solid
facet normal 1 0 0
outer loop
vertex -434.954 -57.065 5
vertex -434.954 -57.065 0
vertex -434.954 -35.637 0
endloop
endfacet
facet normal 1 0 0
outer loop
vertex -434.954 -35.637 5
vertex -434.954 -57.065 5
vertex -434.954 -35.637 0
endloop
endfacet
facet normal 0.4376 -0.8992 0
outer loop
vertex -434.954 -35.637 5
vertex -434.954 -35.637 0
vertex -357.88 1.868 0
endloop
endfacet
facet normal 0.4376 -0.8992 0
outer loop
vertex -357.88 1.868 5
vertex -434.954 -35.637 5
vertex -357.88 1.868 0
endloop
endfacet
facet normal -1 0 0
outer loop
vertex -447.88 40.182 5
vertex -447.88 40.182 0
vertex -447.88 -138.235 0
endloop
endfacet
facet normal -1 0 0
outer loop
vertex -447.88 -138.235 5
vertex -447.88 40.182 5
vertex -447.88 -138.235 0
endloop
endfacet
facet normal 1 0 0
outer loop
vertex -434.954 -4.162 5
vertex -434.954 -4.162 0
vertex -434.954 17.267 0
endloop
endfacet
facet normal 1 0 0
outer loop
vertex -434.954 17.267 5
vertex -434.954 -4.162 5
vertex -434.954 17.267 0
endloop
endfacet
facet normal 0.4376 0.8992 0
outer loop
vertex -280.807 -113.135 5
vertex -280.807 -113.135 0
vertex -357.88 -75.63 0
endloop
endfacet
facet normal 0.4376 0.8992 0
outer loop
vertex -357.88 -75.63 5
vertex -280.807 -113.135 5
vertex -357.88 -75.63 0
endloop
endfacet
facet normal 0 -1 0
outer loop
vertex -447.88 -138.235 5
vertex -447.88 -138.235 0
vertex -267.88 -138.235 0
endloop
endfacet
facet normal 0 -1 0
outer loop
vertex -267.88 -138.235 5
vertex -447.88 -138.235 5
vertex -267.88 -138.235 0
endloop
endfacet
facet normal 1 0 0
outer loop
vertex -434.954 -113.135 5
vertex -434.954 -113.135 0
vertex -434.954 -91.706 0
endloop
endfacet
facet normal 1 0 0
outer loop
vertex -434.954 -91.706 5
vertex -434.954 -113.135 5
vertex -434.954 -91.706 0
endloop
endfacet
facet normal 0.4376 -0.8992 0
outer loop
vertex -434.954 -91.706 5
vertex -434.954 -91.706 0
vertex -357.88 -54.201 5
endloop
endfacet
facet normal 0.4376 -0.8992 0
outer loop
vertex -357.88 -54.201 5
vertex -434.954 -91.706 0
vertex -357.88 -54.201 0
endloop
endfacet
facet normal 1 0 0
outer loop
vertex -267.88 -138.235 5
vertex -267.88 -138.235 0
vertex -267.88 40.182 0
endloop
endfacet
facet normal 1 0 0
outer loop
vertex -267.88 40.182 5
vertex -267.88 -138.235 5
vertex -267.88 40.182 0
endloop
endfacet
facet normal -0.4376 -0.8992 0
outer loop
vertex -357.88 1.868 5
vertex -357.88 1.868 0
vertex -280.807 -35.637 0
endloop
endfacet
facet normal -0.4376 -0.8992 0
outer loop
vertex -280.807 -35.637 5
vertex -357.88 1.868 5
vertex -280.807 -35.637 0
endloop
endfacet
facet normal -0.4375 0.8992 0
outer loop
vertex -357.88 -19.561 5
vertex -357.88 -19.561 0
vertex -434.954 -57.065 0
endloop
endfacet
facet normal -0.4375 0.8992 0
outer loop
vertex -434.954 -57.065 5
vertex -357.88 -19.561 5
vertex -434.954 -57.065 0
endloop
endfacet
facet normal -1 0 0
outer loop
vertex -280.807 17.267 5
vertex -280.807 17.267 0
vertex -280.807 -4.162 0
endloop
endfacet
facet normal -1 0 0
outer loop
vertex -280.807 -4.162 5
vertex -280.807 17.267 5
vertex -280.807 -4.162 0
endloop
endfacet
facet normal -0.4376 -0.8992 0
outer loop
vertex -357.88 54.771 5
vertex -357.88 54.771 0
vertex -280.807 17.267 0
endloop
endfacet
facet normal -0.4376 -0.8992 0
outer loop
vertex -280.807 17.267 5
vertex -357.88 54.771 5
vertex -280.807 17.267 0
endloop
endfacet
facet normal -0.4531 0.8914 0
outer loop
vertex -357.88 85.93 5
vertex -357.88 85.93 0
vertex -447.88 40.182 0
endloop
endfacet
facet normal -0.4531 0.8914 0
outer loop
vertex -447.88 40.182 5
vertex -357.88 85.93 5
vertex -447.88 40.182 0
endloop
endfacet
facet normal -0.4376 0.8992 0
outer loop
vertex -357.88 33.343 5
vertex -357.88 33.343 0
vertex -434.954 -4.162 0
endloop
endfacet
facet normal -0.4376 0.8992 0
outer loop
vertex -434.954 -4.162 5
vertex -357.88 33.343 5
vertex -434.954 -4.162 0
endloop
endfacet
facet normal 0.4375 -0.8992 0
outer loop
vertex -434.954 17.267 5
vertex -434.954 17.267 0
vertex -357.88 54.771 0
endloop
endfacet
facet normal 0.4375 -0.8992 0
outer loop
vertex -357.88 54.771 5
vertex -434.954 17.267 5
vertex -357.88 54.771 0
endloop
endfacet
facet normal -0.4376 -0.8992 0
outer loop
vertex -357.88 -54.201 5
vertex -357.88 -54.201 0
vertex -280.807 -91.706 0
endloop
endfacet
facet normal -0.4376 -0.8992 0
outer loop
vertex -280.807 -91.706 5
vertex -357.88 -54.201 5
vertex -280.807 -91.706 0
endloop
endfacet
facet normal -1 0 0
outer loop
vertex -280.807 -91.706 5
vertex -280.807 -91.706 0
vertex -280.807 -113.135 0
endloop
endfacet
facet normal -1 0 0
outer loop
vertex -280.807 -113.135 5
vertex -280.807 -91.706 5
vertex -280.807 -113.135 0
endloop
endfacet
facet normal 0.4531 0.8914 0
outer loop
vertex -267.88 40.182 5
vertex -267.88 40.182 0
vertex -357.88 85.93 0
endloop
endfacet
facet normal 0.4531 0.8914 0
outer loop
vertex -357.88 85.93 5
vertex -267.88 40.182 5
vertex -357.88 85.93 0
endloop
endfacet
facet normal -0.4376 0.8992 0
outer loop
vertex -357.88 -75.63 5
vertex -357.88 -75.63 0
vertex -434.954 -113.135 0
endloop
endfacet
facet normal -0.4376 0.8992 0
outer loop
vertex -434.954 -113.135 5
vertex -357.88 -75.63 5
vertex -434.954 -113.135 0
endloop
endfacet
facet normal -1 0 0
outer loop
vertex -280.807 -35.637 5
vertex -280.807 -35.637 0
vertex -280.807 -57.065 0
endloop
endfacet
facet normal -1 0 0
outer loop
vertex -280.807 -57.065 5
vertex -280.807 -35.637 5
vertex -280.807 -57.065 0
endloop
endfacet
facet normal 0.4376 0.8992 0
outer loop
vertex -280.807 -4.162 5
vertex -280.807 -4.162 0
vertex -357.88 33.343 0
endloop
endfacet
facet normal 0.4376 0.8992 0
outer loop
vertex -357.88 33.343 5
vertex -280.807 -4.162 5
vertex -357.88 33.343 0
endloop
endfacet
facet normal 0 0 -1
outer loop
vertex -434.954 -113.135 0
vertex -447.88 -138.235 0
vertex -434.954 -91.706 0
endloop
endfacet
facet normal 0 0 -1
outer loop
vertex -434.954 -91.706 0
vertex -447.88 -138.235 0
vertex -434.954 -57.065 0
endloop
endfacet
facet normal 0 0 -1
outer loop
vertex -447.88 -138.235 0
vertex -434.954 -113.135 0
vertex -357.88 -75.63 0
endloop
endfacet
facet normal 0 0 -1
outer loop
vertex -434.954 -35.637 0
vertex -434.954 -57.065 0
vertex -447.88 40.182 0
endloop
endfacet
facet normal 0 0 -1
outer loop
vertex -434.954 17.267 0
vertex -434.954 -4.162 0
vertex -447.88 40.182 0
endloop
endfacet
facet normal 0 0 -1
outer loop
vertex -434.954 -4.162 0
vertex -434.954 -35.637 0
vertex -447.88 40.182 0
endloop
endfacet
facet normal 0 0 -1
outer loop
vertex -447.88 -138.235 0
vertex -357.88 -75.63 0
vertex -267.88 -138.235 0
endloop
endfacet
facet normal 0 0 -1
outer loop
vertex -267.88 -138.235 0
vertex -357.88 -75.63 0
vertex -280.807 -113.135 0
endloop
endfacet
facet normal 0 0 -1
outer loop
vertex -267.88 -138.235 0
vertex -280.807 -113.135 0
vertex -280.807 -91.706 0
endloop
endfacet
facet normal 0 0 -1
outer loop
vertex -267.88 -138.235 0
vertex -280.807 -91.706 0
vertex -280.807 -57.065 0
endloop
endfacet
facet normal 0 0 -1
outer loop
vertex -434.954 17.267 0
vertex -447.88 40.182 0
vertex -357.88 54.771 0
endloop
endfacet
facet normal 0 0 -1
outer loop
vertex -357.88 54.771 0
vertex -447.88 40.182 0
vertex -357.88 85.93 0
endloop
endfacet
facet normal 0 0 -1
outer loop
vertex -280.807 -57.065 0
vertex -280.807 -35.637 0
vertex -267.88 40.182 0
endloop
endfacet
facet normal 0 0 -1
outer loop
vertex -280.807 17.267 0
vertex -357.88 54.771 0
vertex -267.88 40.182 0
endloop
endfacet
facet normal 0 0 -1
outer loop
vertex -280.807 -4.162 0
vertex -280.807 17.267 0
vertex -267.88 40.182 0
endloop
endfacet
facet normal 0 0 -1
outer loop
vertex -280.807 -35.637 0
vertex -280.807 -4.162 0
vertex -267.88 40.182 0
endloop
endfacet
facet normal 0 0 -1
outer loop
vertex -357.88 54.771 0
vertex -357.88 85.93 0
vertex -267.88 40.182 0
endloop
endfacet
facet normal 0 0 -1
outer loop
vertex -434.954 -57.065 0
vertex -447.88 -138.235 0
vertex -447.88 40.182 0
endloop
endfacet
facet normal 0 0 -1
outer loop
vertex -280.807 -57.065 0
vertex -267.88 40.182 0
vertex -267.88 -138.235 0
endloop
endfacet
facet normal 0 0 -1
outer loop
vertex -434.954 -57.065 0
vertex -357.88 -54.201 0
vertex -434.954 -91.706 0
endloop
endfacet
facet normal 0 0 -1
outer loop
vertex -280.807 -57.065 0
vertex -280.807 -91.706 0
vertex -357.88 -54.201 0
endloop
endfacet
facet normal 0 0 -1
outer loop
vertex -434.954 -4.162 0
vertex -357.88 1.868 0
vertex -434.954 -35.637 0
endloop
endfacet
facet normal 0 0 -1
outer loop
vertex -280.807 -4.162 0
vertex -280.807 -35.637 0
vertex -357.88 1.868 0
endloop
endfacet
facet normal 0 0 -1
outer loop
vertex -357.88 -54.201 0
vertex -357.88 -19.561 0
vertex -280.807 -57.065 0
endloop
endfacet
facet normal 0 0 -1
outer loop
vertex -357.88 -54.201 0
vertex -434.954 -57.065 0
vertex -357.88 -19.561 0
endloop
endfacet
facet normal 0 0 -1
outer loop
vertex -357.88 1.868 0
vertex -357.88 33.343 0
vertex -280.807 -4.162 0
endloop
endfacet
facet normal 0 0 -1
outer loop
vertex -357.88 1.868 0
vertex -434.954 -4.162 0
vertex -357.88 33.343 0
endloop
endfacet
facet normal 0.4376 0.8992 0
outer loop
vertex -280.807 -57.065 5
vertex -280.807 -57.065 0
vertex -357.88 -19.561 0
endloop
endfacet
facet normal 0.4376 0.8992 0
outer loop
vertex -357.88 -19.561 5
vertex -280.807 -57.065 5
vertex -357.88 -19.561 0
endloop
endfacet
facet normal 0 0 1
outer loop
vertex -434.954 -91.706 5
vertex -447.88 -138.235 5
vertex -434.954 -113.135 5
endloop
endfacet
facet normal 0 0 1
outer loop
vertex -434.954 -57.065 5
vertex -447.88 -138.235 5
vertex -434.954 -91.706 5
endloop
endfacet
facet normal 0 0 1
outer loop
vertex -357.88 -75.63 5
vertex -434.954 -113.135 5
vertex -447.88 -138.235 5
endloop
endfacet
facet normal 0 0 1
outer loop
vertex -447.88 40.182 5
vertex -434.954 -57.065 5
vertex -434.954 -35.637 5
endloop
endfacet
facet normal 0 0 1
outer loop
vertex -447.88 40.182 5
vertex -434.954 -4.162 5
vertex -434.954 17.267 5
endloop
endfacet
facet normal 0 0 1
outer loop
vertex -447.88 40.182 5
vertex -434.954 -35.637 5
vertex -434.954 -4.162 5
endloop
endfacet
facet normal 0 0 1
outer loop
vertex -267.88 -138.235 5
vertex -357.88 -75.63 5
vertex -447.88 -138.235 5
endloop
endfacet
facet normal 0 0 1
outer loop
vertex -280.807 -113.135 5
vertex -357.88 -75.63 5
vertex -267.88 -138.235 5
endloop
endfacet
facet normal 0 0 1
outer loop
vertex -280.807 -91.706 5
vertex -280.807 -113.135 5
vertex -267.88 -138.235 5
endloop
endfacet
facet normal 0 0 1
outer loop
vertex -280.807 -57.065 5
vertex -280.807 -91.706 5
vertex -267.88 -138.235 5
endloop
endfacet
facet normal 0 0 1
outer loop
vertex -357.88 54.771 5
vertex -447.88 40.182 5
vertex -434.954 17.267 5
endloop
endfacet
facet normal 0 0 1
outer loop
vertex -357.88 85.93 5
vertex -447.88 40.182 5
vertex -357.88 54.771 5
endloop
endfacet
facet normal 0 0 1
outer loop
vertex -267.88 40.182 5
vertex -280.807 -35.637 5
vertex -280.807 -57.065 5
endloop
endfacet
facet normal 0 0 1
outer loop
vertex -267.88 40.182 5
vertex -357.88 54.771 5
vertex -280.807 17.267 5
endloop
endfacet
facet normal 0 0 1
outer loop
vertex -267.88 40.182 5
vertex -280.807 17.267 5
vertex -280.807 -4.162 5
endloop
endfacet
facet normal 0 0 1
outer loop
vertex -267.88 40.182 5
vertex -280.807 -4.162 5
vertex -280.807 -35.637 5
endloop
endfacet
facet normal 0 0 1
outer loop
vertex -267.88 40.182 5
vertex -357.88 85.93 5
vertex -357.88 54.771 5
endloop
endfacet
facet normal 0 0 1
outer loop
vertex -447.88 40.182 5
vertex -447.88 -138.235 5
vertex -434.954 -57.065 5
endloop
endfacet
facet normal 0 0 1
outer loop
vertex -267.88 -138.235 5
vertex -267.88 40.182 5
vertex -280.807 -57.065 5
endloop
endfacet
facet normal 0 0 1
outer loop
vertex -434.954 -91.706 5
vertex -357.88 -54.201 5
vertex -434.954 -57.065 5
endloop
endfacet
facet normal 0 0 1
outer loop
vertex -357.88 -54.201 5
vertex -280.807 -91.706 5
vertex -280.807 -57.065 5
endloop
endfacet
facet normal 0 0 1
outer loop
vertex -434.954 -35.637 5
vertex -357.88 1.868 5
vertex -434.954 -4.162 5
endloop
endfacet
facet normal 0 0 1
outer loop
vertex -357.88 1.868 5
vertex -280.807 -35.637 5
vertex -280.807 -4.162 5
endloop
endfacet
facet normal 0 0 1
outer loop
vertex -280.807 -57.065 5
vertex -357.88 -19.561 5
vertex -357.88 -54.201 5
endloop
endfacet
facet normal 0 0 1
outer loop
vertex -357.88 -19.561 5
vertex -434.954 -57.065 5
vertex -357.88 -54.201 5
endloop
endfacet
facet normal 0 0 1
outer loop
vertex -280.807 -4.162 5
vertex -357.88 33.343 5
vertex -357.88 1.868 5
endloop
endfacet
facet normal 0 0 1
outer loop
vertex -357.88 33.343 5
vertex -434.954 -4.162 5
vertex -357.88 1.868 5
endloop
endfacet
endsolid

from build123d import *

# Parameters (mm, degrees)
F1_DEPTH = 5


with BuildPart() as f1:
    # F0 (on Top) → F1 (new body)
    with BuildSketch(Plane.XY):
        Polygon((-357.880314, 85.929643), (-447.880314, 40.181844), (-447.880314, -138.234643), (-267.880314, -138.234643), (-267.880314, 40.181844), align=None)
        Polygon((-434.953884, -91.706066), (-357.880314, -54.201352), (-280.806743, -91.706066), (-280.806743, -113.134637), (-357.880314, -75.629924), (-434.953884, -113.134637), align=None, mode=Mode.SUBTRACT)
        Polygon((-434.953884, -35.636677), (-357.880314, 1.868036), (-280.806743, -35.636677), (-280.806743, -57.065249), (-357.880314, -19.560536), (-434.953884, -57.065249), align=None, mode=Mode.SUBTRACT)
        Polygon((-434.953884, 17.266547), (-357.880314, 54.77126), (-280.806743, 17.266547), (-280.806743, -4.162025), (-357.880314, 33.342688), (-434.953884, -4.162025), align=None, mode=Mode.SUBTRACT)
    extrude(amount=F1_DEPTH)


solid = f1.part
